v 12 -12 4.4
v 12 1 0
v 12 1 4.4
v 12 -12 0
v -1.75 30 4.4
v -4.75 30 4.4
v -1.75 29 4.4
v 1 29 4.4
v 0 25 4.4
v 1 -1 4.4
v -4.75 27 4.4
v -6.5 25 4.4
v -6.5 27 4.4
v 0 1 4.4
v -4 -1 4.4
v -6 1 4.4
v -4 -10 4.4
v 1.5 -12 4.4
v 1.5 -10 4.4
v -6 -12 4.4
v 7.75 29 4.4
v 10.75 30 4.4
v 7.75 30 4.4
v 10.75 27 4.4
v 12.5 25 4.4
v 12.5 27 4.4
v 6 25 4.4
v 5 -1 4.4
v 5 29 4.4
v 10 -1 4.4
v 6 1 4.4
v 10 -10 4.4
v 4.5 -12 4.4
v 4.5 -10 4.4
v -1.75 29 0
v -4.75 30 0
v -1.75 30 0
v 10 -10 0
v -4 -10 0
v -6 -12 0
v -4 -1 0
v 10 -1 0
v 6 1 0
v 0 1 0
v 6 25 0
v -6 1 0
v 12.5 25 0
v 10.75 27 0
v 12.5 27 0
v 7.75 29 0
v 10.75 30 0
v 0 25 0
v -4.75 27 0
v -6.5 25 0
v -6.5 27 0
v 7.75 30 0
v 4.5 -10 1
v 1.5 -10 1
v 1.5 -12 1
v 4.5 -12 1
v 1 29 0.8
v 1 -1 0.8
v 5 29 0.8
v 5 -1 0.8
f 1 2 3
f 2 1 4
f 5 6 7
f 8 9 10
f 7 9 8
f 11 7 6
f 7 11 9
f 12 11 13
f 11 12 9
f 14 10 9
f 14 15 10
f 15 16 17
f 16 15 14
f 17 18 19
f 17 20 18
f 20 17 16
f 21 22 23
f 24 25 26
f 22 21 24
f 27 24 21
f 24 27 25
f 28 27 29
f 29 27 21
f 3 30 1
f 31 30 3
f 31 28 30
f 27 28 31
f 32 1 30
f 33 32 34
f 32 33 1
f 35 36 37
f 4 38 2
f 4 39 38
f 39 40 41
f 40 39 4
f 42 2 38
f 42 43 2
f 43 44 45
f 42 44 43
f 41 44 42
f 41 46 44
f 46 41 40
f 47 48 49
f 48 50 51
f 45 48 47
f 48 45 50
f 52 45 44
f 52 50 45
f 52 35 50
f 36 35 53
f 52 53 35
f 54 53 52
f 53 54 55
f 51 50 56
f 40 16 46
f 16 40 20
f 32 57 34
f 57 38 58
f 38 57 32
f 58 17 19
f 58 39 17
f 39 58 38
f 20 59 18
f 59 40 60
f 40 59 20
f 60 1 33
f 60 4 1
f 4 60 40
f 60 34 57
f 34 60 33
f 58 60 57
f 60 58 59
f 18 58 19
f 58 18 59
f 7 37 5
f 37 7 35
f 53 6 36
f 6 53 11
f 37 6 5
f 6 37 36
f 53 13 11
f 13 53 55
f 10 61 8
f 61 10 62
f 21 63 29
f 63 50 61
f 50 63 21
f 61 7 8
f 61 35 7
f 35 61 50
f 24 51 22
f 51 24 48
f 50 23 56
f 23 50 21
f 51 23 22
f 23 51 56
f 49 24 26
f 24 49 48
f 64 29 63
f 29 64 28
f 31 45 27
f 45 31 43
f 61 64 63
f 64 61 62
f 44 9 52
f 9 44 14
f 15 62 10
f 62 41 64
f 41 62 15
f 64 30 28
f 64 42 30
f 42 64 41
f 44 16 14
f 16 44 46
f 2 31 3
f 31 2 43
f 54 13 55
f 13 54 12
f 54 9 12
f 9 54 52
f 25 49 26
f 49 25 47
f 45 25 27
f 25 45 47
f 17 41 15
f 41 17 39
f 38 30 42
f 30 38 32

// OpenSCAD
translate(v=[0,-1,0])
  cube(size=[6,30,0.8]);
cube(size=[1,26,4.4]);
translate(v=[5,0,0])
  cube(size=[1,26,4.4]);

translate(v=[-6,-1,0])
  cube(size=[7,2,4.4]);
translate(v=[5,-1,0])
  cube(size=[7,2,4.4]);

translate(v=[-6.5,25,0])
  cube(size=[7.5,2,4.4]);
translate(v=[5,25,0])
  cube(size=[7.5,2,4.4]);

/* Add a base */

translate(v=[-6,-10,0])
  cube(size=[2.0,10,4.4]);

translate(v=[10,-10,0])
  cube(size=[2.0,10,4.4]);

translate(v=[-6,-12,0])
  difference()
  {
    cube(size=[18,2.0,4.4]);

    translate(v=[7.5,0,1.0])
      cube(size=[3.0,2.0,3.4]);
  }


/* Add a top */

translate(v=[-4.75,27,0])
{
  cube(size=[3,3.0,4.4]);
  cube(size=[5.75,2.0,4.4]);
}

translate(v=[7.75,27,0])
{
  cube(size=[3,3.0,4.4]);
  translate(v=[-2.75,0,0])
    cube(size=[5.75,2.0,4.4]);
}
